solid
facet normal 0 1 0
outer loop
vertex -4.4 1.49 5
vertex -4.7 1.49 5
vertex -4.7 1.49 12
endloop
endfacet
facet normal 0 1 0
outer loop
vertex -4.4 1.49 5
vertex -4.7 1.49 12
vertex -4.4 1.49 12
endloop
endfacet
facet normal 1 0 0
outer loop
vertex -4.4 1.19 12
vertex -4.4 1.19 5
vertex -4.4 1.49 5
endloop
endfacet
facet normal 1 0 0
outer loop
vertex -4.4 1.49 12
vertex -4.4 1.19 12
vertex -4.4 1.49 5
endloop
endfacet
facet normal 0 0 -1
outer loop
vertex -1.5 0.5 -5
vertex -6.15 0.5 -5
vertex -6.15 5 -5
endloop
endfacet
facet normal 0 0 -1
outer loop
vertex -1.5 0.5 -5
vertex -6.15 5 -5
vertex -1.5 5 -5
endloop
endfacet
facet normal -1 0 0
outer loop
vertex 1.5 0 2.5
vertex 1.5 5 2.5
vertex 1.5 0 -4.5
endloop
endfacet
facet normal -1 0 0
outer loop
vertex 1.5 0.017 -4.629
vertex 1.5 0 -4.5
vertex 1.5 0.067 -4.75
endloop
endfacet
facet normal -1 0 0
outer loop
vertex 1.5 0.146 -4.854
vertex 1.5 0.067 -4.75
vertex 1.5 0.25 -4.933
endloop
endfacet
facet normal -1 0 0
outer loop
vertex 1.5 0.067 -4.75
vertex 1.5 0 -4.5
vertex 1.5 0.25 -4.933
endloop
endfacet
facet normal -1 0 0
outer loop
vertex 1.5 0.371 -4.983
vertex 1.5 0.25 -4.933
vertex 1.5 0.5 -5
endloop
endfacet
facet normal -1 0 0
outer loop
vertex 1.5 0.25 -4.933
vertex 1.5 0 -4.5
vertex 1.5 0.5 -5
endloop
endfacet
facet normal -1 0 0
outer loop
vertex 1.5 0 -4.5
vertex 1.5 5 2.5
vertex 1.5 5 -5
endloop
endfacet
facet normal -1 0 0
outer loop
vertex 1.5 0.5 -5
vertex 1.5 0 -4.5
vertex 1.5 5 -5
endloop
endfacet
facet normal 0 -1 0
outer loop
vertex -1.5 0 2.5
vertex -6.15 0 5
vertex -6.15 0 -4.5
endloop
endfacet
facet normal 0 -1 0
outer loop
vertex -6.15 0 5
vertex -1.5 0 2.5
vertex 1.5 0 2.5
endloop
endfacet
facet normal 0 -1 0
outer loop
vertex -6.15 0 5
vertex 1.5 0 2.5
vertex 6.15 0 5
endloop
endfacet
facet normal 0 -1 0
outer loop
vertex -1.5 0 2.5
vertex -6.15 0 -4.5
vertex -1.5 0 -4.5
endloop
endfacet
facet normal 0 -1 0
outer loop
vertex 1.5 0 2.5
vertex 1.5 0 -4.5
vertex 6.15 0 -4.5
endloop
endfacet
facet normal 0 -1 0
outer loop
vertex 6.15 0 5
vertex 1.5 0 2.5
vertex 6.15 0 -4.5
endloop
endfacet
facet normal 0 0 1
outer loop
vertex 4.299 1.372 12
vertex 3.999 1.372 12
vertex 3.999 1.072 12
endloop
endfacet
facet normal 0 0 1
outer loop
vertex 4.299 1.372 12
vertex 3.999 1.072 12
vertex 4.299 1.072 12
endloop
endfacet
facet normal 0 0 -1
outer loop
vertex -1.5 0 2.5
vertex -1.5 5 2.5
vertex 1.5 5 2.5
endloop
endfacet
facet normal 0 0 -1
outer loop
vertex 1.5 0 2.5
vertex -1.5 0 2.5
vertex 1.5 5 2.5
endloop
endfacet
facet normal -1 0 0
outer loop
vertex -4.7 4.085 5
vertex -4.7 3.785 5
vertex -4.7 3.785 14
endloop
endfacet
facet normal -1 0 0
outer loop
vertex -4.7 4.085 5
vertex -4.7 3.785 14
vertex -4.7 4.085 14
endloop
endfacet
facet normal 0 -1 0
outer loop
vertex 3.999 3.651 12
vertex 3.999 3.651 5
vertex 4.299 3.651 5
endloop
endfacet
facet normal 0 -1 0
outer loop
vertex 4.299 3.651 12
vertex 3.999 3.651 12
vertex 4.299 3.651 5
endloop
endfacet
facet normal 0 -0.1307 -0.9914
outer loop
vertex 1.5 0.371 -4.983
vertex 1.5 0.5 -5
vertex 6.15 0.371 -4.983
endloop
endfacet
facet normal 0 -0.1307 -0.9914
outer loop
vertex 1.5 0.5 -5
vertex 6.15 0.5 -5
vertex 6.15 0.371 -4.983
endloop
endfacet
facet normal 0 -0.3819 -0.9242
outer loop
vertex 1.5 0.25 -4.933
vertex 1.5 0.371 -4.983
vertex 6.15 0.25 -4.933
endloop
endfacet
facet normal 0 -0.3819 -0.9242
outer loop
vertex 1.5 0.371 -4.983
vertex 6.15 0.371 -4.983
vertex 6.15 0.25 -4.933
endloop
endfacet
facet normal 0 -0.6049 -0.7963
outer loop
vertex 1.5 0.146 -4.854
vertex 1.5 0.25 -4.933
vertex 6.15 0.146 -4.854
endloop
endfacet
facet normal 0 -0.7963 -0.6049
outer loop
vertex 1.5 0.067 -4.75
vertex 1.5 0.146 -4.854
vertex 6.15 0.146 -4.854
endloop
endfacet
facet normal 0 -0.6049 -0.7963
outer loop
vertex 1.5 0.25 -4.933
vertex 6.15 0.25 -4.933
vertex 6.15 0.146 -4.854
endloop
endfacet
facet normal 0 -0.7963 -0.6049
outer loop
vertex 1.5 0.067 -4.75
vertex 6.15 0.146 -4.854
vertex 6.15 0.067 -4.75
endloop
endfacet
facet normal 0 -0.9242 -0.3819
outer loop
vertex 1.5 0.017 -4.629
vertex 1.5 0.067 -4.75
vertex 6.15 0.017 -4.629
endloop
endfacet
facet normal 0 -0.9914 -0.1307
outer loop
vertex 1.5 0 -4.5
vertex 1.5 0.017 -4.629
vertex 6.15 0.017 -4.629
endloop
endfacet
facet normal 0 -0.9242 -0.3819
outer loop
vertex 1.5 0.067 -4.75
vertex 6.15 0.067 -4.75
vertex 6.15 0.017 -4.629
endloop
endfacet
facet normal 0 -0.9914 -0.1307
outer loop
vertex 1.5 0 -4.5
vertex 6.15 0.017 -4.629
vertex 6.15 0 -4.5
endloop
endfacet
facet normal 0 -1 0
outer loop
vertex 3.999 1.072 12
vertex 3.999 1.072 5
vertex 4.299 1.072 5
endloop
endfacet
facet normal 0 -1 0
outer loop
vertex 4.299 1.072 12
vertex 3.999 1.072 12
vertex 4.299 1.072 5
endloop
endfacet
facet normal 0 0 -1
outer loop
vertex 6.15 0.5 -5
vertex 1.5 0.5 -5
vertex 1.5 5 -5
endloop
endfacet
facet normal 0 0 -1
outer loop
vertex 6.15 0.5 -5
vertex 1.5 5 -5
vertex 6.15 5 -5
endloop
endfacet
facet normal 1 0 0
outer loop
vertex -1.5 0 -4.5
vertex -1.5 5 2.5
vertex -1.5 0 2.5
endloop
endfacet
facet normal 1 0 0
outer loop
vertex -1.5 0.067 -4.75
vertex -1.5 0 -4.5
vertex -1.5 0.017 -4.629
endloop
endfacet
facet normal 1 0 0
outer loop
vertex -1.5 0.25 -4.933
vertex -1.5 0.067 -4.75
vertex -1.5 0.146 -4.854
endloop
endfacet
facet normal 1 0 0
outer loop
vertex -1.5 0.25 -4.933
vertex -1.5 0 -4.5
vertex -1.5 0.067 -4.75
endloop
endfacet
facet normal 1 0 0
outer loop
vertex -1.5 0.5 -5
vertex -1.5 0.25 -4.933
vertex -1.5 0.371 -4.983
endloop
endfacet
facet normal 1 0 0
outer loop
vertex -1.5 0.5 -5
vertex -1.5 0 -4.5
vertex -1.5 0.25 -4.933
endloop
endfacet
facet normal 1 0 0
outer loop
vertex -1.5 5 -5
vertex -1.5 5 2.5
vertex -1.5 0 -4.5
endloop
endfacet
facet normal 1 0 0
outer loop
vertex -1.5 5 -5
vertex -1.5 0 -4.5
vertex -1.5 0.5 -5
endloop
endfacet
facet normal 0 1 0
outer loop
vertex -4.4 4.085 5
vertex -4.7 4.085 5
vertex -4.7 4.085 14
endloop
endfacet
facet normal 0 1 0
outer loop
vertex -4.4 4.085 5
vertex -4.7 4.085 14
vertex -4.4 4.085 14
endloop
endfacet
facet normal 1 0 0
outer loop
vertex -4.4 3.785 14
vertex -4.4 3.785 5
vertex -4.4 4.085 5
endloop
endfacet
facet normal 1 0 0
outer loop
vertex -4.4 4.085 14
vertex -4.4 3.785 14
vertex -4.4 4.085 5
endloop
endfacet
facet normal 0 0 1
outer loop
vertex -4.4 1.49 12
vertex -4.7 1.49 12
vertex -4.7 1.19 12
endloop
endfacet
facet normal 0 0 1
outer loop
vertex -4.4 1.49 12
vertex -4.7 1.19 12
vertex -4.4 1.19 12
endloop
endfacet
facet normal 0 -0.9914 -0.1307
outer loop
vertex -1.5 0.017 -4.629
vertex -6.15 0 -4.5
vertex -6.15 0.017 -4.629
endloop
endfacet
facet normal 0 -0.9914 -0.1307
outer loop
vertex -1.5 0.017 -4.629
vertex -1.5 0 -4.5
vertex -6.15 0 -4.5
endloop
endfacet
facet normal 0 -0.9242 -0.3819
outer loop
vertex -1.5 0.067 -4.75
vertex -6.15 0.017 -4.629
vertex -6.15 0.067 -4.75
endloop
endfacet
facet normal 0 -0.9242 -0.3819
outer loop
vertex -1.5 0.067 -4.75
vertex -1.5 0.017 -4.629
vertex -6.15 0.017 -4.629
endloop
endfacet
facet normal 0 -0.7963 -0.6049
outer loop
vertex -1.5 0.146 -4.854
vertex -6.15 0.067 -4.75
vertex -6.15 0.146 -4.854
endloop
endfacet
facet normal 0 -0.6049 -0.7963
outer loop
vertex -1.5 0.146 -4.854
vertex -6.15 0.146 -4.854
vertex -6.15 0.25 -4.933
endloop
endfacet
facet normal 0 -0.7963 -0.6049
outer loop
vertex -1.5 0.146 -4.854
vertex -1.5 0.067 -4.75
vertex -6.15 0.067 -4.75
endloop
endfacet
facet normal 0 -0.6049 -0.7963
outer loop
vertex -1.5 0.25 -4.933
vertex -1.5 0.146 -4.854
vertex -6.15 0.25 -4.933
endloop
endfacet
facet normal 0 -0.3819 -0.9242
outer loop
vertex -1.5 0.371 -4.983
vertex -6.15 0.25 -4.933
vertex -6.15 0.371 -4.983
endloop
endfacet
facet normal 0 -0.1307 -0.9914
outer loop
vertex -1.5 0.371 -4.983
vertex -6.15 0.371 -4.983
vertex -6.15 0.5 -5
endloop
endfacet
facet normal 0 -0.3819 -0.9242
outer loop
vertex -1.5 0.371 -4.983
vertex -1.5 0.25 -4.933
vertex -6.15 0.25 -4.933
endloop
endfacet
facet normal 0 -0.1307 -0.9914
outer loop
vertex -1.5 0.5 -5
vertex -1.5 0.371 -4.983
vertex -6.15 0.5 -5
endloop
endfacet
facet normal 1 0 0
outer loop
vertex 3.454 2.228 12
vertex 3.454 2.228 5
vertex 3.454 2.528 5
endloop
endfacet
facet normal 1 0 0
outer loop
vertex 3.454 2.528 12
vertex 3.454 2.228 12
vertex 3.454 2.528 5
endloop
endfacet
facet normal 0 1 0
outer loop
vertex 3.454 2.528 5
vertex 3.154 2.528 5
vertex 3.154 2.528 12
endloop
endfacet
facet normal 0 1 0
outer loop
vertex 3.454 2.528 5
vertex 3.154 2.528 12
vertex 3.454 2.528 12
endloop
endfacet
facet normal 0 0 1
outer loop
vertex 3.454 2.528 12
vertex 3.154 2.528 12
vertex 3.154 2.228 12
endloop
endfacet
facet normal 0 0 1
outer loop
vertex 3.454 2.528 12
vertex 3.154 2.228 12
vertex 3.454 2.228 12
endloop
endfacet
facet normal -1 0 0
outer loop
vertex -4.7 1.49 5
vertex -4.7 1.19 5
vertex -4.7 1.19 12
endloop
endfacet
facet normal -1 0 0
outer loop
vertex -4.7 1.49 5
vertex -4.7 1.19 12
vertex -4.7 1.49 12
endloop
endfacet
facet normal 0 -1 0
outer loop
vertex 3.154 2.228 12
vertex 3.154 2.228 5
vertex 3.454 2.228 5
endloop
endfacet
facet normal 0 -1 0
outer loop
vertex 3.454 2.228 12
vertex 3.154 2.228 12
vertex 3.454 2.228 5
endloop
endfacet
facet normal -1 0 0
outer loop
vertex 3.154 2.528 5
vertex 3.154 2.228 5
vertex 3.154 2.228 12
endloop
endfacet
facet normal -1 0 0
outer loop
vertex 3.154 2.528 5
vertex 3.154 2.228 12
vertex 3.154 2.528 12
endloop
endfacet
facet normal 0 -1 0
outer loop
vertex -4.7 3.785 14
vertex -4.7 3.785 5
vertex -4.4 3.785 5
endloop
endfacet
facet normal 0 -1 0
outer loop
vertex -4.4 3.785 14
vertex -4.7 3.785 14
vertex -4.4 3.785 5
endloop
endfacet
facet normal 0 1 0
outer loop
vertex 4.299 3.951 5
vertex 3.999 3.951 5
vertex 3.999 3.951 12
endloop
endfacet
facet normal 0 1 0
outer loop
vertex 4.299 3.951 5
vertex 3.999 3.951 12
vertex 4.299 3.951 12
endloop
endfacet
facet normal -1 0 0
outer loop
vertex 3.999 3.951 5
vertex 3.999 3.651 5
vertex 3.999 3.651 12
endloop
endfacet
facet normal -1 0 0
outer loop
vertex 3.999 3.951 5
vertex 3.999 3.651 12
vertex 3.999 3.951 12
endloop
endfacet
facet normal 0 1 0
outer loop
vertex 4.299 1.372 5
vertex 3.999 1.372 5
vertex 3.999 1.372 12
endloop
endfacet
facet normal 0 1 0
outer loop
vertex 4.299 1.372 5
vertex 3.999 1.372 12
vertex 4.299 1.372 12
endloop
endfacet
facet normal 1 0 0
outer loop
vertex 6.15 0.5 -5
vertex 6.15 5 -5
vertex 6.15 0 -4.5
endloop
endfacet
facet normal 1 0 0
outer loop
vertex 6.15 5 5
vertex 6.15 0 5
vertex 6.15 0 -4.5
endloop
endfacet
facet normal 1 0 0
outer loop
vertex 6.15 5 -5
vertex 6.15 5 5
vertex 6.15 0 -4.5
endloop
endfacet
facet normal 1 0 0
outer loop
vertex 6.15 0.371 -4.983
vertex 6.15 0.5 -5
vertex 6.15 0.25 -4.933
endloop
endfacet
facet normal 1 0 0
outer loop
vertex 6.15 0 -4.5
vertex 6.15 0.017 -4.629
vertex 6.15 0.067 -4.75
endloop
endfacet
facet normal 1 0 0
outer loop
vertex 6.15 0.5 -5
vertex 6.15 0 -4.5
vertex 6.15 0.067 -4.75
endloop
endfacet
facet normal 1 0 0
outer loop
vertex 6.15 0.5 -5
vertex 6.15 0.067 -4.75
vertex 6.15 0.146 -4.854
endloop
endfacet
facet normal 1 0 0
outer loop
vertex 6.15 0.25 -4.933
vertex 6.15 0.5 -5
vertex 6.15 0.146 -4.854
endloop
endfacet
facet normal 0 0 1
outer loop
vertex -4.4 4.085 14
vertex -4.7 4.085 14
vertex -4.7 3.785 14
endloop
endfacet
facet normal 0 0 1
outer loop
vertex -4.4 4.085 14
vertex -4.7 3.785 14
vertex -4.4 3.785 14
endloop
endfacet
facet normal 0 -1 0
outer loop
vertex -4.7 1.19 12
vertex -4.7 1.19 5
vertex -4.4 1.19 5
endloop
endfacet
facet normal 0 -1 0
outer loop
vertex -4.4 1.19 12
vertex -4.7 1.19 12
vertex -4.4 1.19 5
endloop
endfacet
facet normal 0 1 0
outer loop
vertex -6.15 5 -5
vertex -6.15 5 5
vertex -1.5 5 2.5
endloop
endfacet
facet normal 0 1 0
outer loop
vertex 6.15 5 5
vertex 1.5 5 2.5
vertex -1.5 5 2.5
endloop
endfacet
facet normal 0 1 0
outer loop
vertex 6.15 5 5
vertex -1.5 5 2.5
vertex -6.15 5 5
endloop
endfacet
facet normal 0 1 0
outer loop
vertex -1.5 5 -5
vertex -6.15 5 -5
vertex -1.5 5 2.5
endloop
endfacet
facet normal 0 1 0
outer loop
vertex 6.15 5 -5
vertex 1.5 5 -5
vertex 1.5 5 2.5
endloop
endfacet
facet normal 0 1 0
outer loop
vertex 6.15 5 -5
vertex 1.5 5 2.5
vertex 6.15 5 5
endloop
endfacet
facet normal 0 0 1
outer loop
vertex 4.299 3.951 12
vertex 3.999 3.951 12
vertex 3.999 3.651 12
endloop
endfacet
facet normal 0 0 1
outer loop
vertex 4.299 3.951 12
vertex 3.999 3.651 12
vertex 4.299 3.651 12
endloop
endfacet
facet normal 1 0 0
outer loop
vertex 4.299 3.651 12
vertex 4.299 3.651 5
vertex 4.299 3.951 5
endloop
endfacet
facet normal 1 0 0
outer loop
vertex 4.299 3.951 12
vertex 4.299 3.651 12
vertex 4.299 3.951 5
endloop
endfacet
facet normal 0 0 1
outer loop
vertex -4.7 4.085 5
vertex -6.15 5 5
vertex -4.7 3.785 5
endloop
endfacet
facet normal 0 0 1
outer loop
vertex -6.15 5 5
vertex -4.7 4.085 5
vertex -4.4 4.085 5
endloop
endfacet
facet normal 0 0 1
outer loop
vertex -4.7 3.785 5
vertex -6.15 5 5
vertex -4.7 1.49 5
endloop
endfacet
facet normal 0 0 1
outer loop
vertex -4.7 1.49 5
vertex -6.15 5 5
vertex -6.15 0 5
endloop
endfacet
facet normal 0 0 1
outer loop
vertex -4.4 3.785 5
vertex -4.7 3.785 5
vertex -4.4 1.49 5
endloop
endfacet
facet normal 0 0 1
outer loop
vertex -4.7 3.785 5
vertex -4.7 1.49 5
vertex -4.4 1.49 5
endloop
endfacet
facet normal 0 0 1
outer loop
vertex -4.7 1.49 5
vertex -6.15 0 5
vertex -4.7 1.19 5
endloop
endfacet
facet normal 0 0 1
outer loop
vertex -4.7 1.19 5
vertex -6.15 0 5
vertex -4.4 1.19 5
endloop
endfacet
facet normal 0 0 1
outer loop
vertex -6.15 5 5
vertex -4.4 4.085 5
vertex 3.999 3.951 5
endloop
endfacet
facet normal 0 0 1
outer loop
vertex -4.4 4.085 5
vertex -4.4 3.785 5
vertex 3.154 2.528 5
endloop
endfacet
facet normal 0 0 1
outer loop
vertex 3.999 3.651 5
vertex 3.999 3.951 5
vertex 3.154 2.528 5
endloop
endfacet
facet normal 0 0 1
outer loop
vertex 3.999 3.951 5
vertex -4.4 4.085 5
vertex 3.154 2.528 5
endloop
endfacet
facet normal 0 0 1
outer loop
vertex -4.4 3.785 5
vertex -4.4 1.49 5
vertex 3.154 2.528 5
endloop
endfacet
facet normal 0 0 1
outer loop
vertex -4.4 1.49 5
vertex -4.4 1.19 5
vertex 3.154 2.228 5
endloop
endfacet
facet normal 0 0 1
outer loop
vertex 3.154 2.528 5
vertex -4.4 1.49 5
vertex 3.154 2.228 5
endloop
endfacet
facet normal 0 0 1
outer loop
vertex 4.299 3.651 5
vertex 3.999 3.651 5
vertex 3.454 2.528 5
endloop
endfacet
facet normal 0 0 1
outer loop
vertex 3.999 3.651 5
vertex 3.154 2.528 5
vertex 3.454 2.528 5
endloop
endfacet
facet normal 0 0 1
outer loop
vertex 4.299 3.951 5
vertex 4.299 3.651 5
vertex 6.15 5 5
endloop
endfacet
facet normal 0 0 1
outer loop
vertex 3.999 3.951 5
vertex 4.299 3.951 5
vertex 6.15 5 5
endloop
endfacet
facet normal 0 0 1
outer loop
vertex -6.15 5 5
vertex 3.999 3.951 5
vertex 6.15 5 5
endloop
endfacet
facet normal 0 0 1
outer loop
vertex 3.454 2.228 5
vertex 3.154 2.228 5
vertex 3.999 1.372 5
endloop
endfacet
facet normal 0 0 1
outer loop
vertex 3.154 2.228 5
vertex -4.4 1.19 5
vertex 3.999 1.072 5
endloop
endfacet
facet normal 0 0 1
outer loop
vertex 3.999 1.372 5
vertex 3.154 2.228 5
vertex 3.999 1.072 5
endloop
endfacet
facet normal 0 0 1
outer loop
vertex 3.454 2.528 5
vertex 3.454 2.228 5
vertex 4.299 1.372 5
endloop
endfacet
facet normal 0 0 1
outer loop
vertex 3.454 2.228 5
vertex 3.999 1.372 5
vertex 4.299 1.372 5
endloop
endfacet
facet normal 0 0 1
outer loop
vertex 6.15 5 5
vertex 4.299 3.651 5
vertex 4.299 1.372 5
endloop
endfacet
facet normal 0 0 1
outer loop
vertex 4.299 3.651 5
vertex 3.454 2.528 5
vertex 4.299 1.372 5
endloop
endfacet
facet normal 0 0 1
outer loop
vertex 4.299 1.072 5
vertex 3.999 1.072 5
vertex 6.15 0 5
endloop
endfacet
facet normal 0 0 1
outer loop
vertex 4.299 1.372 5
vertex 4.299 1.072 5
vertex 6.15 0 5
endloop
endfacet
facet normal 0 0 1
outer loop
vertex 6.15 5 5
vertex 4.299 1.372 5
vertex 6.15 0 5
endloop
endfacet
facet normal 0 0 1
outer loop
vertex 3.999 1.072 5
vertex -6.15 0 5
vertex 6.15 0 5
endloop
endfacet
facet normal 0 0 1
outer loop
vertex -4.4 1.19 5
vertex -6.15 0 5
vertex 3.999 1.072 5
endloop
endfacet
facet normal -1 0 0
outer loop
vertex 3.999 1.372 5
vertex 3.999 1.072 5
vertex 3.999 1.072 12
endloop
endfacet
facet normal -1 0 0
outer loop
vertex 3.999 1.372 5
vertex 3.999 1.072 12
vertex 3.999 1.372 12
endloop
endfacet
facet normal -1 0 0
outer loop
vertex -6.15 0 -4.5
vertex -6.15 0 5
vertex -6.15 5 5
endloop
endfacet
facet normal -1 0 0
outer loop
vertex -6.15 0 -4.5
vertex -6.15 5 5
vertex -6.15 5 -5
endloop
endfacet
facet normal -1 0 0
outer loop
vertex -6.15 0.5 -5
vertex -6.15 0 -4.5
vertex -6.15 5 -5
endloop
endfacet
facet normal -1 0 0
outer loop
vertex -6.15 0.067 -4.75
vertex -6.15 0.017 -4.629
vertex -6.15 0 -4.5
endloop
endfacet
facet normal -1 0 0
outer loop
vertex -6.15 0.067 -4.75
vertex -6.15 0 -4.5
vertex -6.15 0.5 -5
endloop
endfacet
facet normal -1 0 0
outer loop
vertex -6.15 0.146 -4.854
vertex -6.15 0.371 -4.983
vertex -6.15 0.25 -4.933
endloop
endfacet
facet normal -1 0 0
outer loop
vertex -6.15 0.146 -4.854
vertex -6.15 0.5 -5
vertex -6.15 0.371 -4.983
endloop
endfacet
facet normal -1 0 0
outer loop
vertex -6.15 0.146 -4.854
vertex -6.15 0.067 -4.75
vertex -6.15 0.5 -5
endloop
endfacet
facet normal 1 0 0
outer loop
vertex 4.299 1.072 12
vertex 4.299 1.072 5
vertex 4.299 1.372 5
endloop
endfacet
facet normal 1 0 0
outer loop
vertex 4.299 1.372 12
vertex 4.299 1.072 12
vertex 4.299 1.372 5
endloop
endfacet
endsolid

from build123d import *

# Parameters (mm, degrees)
SKETCH1_W           = 12.3
SKETCH1_H           = 10
BOSS_EXTRUDE1_DEPTH = 5
SKETCH2_W           = 1.5
SKETCH2_H           = 7.5
CUT_EXTRUDE1_DEPTH  = 5
LPATTERN1_COUNT     = 2
LPATTERN1_PITCH     = 1.5
FILLET4_R           = 0.5
SKETCH3_W           = 0.3
SKETCH3_H           = 0.3
BOSS_EXTRUDE2_DEPTH = 9
SKETCH4_W           = 0.3
SKETCH4_H           = 0.3
BOSS_EXTRUDE3_DEPTH = 7
SKETCH5_W           = 0.3
SKETCH5_H           = 0.3
BOSS_EXTRUDE4_DEPTH = 7
SKETCH6_W           = 0.3
SKETCH6_H           = 0.3
BOSS_EXTRUDE5_DEPTH = 7
SKETCH7_W           = 0.3
SKETCH7_H           = 0.3
BOSS_EXTRUDE6_DEPTH = 7


with BuildPart() as part:
    # Sketch1 → Boss-Extrude1 (new body)
    with BuildSketch(Plane(origin=(0, 0, 0), x_dir=(1, 0, 0), z_dir=(0, 1, 0))):
        Rectangle(SKETCH1_W, SKETCH1_H)
    extrude(amount=BOSS_EXTRUDE1_DEPTH)

    # Sketch2 → Cut-Extrude1 (cut)
    with BuildSketch(Plane(origin=(0, 5, 0), x_dir=(1, 0, 0), z_dir=(0, 1, 0))):
        with Locations((-0.75, 1.25)):
            Rectangle(SKETCH2_W, SKETCH2_H)
    cut_extrude1 = extrude(amount=-CUT_EXTRUDE1_DEPTH, mode=Mode.SUBTRACT)

    # LPattern1: Cut-Extrude1 ×2
    with Locations(*[(i * LPATTERN1_PITCH, 0, 0) for i in range(1, LPATTERN1_COUNT)]):
        add(cut_extrude1, mode=Mode.SUBTRACT)

    # Fillet4
    fillet4_edges = [part.edges().sort_by_distance(p)[0] for p in [
        (-3.825, 0, -5),
        (3.825, 0, -5),
    ]]
    fillet(fillet4_edges, radius=FILLET4_R)

    # Sketch3 → Boss-Extrude2 (add)
    with BuildSketch(Plane.XY.offset(5)):
        with Locations((-4.549701493, 3.935074627)):
            Rectangle(SKETCH3_W, SKETCH3_H)
    extrude(amount=BOSS_EXTRUDE2_DEPTH)

    # Sketch4 → Boss-Extrude3 (add)
    with BuildSketch(Plane.XY.offset(5)):
        with Locations((-4.549701493, 1.340298507)):
            Rectangle(SKETCH4_W, SKETCH4_H)
    extrude(amount=BOSS_EXTRUDE3_DEPTH)

    # Sketch5 → Boss-Extrude4 (add)
    with BuildSketch(Plane.XY.offset(5)):
        with Locations((4.149040482, 3.801410011)):
            Rectangle(SKETCH5_W, SKETCH5_H)
    extrude(amount=BOSS_EXTRUDE4_DEPTH)

    # Sketch6 → Boss-Extrude5 (add)
    with BuildSketch(Plane.XY.offset(5)):
        with Locations((4.149040482, 1.222139303)):
            Rectangle(SKETCH6_W, SKETCH6_H)
    extrude(amount=BOSS_EXTRUDE5_DEPTH)

    # Sketch7 → Boss-Extrude6 (add)
    with BuildSketch(Plane.XY.offset(5)):
        with Locations((3.303641109, 2.378478397)):
            Rectangle(SKETCH7_W, SKETCH7_H)
    extrude(amount=BOSS_EXTRUDE6_DEPTH)


solid = part.part
